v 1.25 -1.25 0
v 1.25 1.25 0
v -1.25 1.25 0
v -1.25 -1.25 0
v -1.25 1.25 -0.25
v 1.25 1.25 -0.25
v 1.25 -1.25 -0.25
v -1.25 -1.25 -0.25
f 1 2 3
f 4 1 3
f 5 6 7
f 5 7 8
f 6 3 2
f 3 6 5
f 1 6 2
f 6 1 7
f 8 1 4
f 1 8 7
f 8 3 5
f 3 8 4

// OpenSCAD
// file: lib/lodge_kit.scad
// Lodge shell tile kit — shared dimensions and modules.
//
// The game paints a lodge footprint in 5 m cells and resolves the
// exterior from these tiles at half-cell (2.5 m) resolution; see
// internal/world/lodge_shell.go. Every tile is authored in the same
// canonical frame:
//
//   * origin on the lodge floor plane (Z = 0);
//   * wall-type tiles sit on a footprint edge, centred on it, with the
//     OUTSIDE toward SCAD −Y (game +Z) and the wall thickness toward +Y;
//   * roof tiles are centred on a half-cell, with Z = 0 at the tile's
//     lowest corner; slopes fall toward −Y (game +Z);
//   * corner tiles sit on a grid vertex; an outer corner's building is
//     in the SCAD (−X, +Y) quadrant, an inner corner's notch in (+X, −Y).
//
// Colours are near-neutral: the renderer tints walls and roofs per lodge
// from a seeded palette (world.ShellPalette).
//
// Keep these in sync with the constants in lodge_shell.go.

tile   = 2.5;   // ShellTileSize
wall_h = 5.0;   // ShellWallHeight
rise   = 2.1;   // ShellRoofRise, per tile of run
pitch  = rise / tile;

wall_t   = 0.35;  // wall thickness
sink     = 1.5;   // walls run this far below the floor to hide pad grading
roof_t   = 0.25;  // roof slab thickness
overhang = 0.7;   // eaves overhang past the wall plane

c_wall   = [0.92, 0.90, 0.86];
c_stone  = [0.62, 0.61, 0.60];
c_trim   = [0.97, 0.97, 0.95];
c_glass  = [0.30, 0.42, 0.52];
c_door   = [0.36, 0.25, 0.18];
c_roof   = [0.97, 0.97, 0.97];
c_fascia = [0.55, 0.52, 0.50];

// Plain wall panel: timber above a stone plinth, a trim band under the
// eaves.
module wall_panel() {
    color(c_wall)
        translate([-tile/2, 0, -sink]) cube([tile, wall_t, wall_h + sink]);
    color(c_stone)
        translate([-tile/2, -0.06, -sink]) cube([tile, wall_t, sink + 0.7]);
    color(c_trim)
        translate([-tile/2, -0.04, wall_h - 0.3]) cube([tile, 0.1, 0.3]);
    battens();
}

// Horizontal board lines above the plinth.
module battens() {
    color(c_wall * 0.8)
        for (z = [1.3 : 0.6 : wall_h - 0.6])
            translate([-tile/2, -0.03, z]) cube([tile, 0.04, 0.06]);
}

// A framed pane on the outer face. x0/w along the wall, z0/h up it.
module pane(x0, w, z0, h) {
    color(c_trim)
        translate([x0 - 0.1, -0.05, z0 - 0.1]) cube([w + 0.2, 0.06, h + 0.2]);
    color(c_glass)
        translate([x0, -0.08, z0]) cube([w, 0.06, h]);
}

module wall_window() {
    wall_panel();
    pane(-0.7, 1.4, 1.4, 2.2);
    color(c_trim) translate([-0.02, -0.1, 1.4]) cube([0.04, 0.04, 2.2]); // mullion
}

// Tall window flanked by shutters.
module wall_window_alt() {
    wall_panel();
    pane(-0.5, 1.0, 1.2, 2.8);
    color(c_door) {
        translate([-1.0, -0.1, 1.2]) cube([0.4, 0.05, 2.8]);
        translate([ 0.6, -0.1, 1.2]) cube([0.4, 0.05, 2.8]);
    }
}

// Floor-to-eave glazing for food courts: a low stone sill, then glass in
// three lights.
module wall_glazed() {
    color(c_wall)
        translate([-tile/2, 0, -sink]) cube([tile, wall_t, wall_h + sink]);
    color(c_stone)
        translate([-tile/2, -0.06, -sink]) cube([tile, wall_t, sink + 0.35]);
    color(c_glass)
        translate([-tile/2, -0.09, 0.35]) cube([tile, 0.06, wall_h - 0.75]);
    color(c_trim) {
        for (x = [-tile/2, -tile/6, tile/6, tile/2 - 0.08])
            translate([x, -0.12, 0.35]) cube([0.08, 0.06, wall_h - 0.75]);
        translate([-tile/2, -0.12, wall_h - 0.45]) cube([tile, 0.07, 0.1]);
    }
}

// Glazed entry door under a small canopy, with a step.
module door() {
    color(c_wall)
        translate([-tile/2, 0, -sink]) cube([tile, wall_t, wall_h + sink]);
    color(c_stone)
        translate([-tile/2, -0.06, -sink]) cube([tile, wall_t, sink + 0.15]);
    battens();
    color(c_door)
        translate([-0.9, -0.1, 0]) cube([1.8, 0.1, 2.7]);
    color(c_glass) {
        translate([-0.75, -0.13, 0.9]) cube([0.65, 0.05, 1.6]);
        translate([ 0.10, -0.13, 0.9]) cube([0.65, 0.05, 1.6]);
    }
    color(c_trim)
        translate([-tile/2, -0.04, wall_h - 0.3]) cube([tile, 0.1, 0.3]);
    color(c_roof)   // canopy
        translate([-1.2, -1.3, 3.0])
            rotate([-12, 0, 0]) cube([2.4, 1.3, 0.12]);
    color(c_stone)  // step
        translate([-1.1, -0.9, -0.3]) cube([2.2, 0.9, 0.42]);
}

module corner_outer() {
    color(c_stone)
        translate([-0.3, -0.05, -sink]) cube([0.35, 0.35, wall_h + sink - 0.3]);
}

module corner_inner() {
    color(c_trim)
        translate([0, -0.12, 0]) cube([0.12, 0.12, wall_h - 0.3]);
}

// Roof slab over one half-cell. h lists corner heights (in rise units)
// in SCAD order (−X,+Y), (+X,+Y), (+X,−Y), (−X,−Y); split names which
// diagonal the top surface folds along: 0 through corners 0–2, 1
// through corners 1–3.
module roof_tile(h, split) {
    p = [[-tile/2, tile/2], [tile/2, tile/2], [tile/2, -tile/2], [-tile/2, -tile/2]];
    top = [for (i = [0:3]) [p[i][0], p[i][1], h[i] * rise]];
    bot = [for (i = [0:3]) [p[i][0], p[i][1], h[i] * rise - roof_t]];
    tris = split == 0 ? [[0, 1, 2], [0, 2, 3]] : [[0, 1, 3], [1, 2, 3]];
    color(c_roof)
        polyhedron(
            points = concat(top, bot),
            faces = concat(
                // top (clockwise seen from above = outward in OpenSCAD)
                [for (t = tris) [t[0], t[1], t[2]]],
                [for (t = tris) [t[2] + 4, t[1] + 4, t[0] + 4]],
                [for (i = [0:3]) [i, i + 4, (i + 1) % 4 + 4, (i + 1) % 4]]
            ));
}

// Eaves strip past a wall edge: continues the roof plane outward and
// down, finished with a fascia board.
module eave() {
    drop = overhang * pitch;
    color(c_roof)
        polyhedron(
            points = [
                [-tile/2, 0, 0], [tile/2, 0, 0], [tile/2, -overhang, -drop], [-tile/2, -overhang, -drop],
                [-tile/2, 0, -roof_t], [tile/2, 0, -roof_t], [tile/2, -overhang, -drop - roof_t], [-tile/2, -overhang, -drop - roof_t],
            ],
            faces = [[0, 1, 2, 3], [7, 6, 5, 4], [0, 4, 5, 1], [1, 5, 6, 2], [2, 6, 7, 3], [3, 7, 4, 0]]);
    color(c_fascia)
        translate([-tile/2, -overhang - 0.05, -drop - roof_t - 0.1]) cube([tile, 0.08, roof_t + 0.2]);
}

// Eaves in the square past an outer corner: a hip folding along the
// diagonal away from the building.
module eave_corner() {
    o = overhang;
    d = o * pitch;
    color(c_roof)
        polyhedron(
            points = [
                [0, 0, 0], [o, 0, -d], [o, -o, -d], [0, -o, -d],
                [0, 0, -roof_t], [o, 0, -d - roof_t], [o, -o, -d - roof_t], [0, -o, -d - roof_t],
            ],
            faces = [[0, 1, 2], [0, 2, 3], [6, 5, 4], [7, 6, 4], [0, 4, 5, 1], [1, 5, 6, 2], [2, 6, 7, 3], [3, 7, 4, 0]]);
    color(c_fascia) {
        translate([0, -o - 0.05, -d - roof_t - 0.1]) cube([o + 0.05, 0.08, roof_t + 0.2]);
        translate([o - 0.03, -o - 0.05, -d - roof_t - 0.1]) cube([0.08, o + 0.05, roof_t + 0.2]);
    }
}

module chimney() {
    color(c_stone)
        translate([-0.55, -0.55, -1.0]) cube([1.1, 1.1, rise + 3.0]);
    color(c_fascia)
        translate([-0.65, -0.65, rise + 1.8]) cube([1.3, 1.3, 0.2]);
}
// main file
// Lodge shell kit: flat roof. See lib/lodge_kit.scad.
include <lib/lodge_kit.scad>
roof_tile([0, 0, 0, 0], 0);
